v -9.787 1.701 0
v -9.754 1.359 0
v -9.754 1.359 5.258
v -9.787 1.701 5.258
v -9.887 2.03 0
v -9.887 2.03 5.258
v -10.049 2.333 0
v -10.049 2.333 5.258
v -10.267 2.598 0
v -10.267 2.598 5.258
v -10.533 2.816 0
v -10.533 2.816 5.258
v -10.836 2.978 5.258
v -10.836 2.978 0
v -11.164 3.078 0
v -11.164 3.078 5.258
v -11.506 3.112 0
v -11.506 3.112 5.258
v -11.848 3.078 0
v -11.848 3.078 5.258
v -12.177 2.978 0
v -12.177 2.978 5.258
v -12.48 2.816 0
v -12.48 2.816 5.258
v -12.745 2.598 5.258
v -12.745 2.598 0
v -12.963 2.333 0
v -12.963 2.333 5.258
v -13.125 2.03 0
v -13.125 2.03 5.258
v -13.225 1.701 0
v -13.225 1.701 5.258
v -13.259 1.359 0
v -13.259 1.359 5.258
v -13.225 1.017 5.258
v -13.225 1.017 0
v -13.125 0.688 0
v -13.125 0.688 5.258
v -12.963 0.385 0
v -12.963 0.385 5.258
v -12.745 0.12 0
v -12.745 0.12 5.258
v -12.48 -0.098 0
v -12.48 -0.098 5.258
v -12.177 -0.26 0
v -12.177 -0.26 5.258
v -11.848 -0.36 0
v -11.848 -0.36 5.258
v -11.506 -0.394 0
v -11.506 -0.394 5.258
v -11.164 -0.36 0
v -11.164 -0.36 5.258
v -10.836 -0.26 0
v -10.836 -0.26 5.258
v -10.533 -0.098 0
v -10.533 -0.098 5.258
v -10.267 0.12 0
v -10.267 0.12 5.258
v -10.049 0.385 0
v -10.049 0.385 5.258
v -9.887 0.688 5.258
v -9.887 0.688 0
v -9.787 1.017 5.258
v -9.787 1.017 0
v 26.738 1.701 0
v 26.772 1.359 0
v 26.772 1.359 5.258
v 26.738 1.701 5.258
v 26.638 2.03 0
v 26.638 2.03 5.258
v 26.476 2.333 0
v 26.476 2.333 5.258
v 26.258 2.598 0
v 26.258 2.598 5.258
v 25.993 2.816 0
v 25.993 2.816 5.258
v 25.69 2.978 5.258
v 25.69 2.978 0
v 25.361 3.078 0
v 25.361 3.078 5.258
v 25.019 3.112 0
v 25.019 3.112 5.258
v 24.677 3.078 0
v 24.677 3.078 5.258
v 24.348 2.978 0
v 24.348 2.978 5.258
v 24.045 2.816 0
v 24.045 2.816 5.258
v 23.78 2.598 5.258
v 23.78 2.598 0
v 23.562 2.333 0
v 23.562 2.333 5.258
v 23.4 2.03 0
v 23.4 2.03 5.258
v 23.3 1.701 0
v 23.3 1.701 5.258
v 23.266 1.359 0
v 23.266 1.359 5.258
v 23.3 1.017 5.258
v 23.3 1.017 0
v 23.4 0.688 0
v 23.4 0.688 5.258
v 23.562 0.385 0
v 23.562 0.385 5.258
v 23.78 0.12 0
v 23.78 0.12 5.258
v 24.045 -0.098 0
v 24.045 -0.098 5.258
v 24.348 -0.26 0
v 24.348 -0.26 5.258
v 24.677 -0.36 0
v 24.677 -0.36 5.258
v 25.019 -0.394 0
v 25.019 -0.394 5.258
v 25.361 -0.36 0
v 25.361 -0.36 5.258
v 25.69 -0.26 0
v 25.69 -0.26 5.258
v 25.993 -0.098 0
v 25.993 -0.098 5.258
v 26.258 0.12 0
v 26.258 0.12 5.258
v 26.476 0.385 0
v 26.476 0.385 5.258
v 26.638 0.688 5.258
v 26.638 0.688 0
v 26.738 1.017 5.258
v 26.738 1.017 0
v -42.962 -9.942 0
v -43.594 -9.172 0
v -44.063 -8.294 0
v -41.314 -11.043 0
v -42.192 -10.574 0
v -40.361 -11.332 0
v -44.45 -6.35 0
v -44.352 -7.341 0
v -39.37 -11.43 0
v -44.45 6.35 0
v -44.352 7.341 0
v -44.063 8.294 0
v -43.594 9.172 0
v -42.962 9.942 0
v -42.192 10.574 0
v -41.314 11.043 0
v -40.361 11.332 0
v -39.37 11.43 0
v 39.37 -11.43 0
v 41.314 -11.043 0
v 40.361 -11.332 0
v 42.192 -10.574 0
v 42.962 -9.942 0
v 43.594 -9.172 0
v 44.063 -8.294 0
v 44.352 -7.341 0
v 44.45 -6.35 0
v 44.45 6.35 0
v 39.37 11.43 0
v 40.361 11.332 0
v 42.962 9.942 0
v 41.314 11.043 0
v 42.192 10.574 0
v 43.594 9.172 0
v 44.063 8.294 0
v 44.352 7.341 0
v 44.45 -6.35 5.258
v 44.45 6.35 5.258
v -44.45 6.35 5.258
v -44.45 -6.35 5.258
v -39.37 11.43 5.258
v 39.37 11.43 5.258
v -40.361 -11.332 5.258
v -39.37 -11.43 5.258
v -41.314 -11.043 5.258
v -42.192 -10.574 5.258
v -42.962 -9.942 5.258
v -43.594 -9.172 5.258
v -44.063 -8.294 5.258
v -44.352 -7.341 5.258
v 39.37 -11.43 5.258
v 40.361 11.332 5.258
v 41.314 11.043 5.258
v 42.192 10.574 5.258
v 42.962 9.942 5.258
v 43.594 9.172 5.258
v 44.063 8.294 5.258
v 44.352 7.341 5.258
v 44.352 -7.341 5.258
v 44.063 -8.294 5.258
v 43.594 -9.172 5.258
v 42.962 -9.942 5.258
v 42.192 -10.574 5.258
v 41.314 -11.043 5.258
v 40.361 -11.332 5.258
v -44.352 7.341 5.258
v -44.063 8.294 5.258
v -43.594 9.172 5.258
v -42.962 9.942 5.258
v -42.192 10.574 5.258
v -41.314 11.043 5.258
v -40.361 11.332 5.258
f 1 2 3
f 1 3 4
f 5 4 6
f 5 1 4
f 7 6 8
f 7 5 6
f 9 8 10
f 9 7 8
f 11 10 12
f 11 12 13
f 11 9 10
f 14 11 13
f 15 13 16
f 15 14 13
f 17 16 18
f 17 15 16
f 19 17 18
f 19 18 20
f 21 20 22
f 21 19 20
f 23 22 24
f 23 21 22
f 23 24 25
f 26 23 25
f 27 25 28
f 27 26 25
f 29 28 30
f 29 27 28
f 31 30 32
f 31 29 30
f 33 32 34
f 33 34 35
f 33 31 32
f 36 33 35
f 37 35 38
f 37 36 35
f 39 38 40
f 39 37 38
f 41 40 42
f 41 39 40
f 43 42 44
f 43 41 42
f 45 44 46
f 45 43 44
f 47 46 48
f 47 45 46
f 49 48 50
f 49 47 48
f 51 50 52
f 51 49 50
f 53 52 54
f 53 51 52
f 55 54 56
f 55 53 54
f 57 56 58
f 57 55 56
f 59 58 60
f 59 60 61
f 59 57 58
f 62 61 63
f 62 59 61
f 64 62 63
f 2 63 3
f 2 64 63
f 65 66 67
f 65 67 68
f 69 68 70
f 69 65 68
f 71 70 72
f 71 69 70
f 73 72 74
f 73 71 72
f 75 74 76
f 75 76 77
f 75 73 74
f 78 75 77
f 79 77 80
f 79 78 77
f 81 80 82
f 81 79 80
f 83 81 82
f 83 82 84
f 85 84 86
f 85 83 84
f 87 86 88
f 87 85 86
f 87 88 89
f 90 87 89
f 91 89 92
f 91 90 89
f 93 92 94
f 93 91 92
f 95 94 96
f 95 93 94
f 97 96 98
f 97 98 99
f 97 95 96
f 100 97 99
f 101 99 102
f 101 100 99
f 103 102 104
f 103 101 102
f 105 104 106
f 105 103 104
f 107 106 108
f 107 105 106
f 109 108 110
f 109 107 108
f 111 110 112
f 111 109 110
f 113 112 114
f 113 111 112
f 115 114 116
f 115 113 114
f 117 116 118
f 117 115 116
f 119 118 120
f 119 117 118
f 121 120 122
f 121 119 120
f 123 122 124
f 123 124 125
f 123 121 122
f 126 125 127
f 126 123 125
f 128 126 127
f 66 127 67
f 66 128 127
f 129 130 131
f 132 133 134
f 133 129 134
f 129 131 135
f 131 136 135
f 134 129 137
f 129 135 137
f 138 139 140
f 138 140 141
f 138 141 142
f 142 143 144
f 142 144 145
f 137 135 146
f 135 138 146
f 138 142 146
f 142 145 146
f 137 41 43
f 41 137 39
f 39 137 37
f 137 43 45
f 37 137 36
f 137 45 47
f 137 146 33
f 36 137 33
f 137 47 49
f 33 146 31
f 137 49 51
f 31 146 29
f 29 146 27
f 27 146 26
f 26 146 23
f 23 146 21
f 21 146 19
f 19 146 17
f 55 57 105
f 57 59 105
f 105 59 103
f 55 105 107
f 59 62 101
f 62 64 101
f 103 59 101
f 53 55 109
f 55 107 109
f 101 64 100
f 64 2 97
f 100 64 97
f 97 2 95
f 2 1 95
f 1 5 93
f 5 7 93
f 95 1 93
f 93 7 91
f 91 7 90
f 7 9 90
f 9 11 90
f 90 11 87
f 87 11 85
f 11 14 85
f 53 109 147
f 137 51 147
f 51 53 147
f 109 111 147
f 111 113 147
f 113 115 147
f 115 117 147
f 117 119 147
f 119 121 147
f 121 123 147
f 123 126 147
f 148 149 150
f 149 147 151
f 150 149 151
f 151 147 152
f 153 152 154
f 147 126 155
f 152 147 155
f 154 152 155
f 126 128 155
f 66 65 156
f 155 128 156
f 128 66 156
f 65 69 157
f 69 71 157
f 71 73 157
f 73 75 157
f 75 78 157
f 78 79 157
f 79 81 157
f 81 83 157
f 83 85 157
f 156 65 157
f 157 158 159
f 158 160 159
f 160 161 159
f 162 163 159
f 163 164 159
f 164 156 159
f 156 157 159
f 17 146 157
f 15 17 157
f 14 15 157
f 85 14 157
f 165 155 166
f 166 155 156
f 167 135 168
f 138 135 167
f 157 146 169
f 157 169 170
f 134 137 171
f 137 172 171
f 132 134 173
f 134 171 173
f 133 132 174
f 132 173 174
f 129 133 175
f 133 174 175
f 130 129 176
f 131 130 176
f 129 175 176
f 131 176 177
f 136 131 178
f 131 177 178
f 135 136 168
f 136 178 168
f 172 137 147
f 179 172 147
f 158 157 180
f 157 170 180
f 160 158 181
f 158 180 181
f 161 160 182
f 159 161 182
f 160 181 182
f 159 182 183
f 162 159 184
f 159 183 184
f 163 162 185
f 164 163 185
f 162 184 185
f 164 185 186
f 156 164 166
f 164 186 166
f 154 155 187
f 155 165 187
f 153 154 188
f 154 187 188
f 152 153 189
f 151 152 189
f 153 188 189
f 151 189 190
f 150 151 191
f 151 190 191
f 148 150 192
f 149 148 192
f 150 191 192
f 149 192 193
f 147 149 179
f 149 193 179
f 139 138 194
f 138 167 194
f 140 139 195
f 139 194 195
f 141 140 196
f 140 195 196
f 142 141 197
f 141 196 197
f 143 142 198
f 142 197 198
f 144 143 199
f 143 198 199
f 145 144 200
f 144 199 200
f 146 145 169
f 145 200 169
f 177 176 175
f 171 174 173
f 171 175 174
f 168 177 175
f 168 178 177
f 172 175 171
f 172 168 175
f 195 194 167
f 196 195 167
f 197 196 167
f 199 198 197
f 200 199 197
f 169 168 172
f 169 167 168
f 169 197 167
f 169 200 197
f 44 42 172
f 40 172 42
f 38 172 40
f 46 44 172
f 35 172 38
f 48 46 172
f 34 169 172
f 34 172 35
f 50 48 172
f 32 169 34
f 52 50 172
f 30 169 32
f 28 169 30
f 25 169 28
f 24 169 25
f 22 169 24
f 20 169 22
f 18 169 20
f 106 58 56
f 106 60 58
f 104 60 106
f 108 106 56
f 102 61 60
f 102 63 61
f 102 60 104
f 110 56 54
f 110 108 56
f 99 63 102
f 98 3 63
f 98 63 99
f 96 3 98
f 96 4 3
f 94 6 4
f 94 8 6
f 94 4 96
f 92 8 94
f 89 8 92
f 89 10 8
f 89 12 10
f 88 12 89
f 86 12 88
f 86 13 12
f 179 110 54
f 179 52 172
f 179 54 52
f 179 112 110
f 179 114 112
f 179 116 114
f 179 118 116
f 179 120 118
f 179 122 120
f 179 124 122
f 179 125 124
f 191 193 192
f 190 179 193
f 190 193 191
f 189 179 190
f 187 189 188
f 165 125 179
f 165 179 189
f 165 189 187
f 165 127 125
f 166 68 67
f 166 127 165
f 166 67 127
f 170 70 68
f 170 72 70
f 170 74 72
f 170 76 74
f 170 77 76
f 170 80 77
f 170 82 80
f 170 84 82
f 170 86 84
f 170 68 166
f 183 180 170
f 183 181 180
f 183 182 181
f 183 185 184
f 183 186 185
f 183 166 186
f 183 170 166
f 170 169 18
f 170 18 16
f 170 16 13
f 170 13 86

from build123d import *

# Parameters (mm, degrees)
SKETCH1_W           = 88.9
SKETCH1_H           = 22.86
BOSS_EXTRUDE1_DEPTH = 5.2578
FILLET1_R           = 5.08
FILLET2_R           = 5.08
FILLET3_R           = 5.08
FILLET4_R           = 5.08
CAVITY1_OUTLINE_R   = 1.7526
CAVITY1_DEPTH       = 5.2578


# Read off the part's stored shape, not the designer's step: Cavity1
with BuildPart() as part:
    # Sketch1 → Boss-Extrude1 (new body)
    with BuildSketch(Plane.XY):
        Rectangle(SKETCH1_W, SKETCH1_H)
    extrude(amount=BOSS_EXTRUDE1_DEPTH)

    # Fillet1
    fillet1_edges = [part.edges().sort_by_distance(p)[0] for p in [
        (-44.45, 11.43, 2.6289),
    ]]
    fillet(fillet1_edges, radius=FILLET1_R)

    # Fillet2
    fillet2_edges = [part.edges().sort_by_distance(p)[0] for p in [
        (44.45, 11.43, 2.6289),
    ]]
    fillet(fillet2_edges, radius=FILLET2_R)

    # Fillet3
    fillet3_edges = [part.edges().sort_by_distance(p)[0] for p in [
        (44.45, -11.43, 2.6289),
    ]]
    fillet(fillet3_edges, radius=FILLET3_R)

    # Fillet4
    fillet4_edges = [part.edges().sort_by_distance(p)[0] for p in [
        (-44.45, -11.43, 2.6289),
    ]]
    fillet(fillet4_edges, radius=FILLET4_R)

    # Cavity1 outline → Cavity1 (cut)
    with BuildSketch(Plane.XY):
        with Locations((25.019, 1.3589)):
            Circle(CAVITY1_OUTLINE_R)
        with Locations((-11.5062, 1.3589)):
            Circle(CAVITY1_OUTLINE_R)
    extrude(amount=CAVITY1_DEPTH, mode=Mode.SUBTRACT)


solid = part.part
